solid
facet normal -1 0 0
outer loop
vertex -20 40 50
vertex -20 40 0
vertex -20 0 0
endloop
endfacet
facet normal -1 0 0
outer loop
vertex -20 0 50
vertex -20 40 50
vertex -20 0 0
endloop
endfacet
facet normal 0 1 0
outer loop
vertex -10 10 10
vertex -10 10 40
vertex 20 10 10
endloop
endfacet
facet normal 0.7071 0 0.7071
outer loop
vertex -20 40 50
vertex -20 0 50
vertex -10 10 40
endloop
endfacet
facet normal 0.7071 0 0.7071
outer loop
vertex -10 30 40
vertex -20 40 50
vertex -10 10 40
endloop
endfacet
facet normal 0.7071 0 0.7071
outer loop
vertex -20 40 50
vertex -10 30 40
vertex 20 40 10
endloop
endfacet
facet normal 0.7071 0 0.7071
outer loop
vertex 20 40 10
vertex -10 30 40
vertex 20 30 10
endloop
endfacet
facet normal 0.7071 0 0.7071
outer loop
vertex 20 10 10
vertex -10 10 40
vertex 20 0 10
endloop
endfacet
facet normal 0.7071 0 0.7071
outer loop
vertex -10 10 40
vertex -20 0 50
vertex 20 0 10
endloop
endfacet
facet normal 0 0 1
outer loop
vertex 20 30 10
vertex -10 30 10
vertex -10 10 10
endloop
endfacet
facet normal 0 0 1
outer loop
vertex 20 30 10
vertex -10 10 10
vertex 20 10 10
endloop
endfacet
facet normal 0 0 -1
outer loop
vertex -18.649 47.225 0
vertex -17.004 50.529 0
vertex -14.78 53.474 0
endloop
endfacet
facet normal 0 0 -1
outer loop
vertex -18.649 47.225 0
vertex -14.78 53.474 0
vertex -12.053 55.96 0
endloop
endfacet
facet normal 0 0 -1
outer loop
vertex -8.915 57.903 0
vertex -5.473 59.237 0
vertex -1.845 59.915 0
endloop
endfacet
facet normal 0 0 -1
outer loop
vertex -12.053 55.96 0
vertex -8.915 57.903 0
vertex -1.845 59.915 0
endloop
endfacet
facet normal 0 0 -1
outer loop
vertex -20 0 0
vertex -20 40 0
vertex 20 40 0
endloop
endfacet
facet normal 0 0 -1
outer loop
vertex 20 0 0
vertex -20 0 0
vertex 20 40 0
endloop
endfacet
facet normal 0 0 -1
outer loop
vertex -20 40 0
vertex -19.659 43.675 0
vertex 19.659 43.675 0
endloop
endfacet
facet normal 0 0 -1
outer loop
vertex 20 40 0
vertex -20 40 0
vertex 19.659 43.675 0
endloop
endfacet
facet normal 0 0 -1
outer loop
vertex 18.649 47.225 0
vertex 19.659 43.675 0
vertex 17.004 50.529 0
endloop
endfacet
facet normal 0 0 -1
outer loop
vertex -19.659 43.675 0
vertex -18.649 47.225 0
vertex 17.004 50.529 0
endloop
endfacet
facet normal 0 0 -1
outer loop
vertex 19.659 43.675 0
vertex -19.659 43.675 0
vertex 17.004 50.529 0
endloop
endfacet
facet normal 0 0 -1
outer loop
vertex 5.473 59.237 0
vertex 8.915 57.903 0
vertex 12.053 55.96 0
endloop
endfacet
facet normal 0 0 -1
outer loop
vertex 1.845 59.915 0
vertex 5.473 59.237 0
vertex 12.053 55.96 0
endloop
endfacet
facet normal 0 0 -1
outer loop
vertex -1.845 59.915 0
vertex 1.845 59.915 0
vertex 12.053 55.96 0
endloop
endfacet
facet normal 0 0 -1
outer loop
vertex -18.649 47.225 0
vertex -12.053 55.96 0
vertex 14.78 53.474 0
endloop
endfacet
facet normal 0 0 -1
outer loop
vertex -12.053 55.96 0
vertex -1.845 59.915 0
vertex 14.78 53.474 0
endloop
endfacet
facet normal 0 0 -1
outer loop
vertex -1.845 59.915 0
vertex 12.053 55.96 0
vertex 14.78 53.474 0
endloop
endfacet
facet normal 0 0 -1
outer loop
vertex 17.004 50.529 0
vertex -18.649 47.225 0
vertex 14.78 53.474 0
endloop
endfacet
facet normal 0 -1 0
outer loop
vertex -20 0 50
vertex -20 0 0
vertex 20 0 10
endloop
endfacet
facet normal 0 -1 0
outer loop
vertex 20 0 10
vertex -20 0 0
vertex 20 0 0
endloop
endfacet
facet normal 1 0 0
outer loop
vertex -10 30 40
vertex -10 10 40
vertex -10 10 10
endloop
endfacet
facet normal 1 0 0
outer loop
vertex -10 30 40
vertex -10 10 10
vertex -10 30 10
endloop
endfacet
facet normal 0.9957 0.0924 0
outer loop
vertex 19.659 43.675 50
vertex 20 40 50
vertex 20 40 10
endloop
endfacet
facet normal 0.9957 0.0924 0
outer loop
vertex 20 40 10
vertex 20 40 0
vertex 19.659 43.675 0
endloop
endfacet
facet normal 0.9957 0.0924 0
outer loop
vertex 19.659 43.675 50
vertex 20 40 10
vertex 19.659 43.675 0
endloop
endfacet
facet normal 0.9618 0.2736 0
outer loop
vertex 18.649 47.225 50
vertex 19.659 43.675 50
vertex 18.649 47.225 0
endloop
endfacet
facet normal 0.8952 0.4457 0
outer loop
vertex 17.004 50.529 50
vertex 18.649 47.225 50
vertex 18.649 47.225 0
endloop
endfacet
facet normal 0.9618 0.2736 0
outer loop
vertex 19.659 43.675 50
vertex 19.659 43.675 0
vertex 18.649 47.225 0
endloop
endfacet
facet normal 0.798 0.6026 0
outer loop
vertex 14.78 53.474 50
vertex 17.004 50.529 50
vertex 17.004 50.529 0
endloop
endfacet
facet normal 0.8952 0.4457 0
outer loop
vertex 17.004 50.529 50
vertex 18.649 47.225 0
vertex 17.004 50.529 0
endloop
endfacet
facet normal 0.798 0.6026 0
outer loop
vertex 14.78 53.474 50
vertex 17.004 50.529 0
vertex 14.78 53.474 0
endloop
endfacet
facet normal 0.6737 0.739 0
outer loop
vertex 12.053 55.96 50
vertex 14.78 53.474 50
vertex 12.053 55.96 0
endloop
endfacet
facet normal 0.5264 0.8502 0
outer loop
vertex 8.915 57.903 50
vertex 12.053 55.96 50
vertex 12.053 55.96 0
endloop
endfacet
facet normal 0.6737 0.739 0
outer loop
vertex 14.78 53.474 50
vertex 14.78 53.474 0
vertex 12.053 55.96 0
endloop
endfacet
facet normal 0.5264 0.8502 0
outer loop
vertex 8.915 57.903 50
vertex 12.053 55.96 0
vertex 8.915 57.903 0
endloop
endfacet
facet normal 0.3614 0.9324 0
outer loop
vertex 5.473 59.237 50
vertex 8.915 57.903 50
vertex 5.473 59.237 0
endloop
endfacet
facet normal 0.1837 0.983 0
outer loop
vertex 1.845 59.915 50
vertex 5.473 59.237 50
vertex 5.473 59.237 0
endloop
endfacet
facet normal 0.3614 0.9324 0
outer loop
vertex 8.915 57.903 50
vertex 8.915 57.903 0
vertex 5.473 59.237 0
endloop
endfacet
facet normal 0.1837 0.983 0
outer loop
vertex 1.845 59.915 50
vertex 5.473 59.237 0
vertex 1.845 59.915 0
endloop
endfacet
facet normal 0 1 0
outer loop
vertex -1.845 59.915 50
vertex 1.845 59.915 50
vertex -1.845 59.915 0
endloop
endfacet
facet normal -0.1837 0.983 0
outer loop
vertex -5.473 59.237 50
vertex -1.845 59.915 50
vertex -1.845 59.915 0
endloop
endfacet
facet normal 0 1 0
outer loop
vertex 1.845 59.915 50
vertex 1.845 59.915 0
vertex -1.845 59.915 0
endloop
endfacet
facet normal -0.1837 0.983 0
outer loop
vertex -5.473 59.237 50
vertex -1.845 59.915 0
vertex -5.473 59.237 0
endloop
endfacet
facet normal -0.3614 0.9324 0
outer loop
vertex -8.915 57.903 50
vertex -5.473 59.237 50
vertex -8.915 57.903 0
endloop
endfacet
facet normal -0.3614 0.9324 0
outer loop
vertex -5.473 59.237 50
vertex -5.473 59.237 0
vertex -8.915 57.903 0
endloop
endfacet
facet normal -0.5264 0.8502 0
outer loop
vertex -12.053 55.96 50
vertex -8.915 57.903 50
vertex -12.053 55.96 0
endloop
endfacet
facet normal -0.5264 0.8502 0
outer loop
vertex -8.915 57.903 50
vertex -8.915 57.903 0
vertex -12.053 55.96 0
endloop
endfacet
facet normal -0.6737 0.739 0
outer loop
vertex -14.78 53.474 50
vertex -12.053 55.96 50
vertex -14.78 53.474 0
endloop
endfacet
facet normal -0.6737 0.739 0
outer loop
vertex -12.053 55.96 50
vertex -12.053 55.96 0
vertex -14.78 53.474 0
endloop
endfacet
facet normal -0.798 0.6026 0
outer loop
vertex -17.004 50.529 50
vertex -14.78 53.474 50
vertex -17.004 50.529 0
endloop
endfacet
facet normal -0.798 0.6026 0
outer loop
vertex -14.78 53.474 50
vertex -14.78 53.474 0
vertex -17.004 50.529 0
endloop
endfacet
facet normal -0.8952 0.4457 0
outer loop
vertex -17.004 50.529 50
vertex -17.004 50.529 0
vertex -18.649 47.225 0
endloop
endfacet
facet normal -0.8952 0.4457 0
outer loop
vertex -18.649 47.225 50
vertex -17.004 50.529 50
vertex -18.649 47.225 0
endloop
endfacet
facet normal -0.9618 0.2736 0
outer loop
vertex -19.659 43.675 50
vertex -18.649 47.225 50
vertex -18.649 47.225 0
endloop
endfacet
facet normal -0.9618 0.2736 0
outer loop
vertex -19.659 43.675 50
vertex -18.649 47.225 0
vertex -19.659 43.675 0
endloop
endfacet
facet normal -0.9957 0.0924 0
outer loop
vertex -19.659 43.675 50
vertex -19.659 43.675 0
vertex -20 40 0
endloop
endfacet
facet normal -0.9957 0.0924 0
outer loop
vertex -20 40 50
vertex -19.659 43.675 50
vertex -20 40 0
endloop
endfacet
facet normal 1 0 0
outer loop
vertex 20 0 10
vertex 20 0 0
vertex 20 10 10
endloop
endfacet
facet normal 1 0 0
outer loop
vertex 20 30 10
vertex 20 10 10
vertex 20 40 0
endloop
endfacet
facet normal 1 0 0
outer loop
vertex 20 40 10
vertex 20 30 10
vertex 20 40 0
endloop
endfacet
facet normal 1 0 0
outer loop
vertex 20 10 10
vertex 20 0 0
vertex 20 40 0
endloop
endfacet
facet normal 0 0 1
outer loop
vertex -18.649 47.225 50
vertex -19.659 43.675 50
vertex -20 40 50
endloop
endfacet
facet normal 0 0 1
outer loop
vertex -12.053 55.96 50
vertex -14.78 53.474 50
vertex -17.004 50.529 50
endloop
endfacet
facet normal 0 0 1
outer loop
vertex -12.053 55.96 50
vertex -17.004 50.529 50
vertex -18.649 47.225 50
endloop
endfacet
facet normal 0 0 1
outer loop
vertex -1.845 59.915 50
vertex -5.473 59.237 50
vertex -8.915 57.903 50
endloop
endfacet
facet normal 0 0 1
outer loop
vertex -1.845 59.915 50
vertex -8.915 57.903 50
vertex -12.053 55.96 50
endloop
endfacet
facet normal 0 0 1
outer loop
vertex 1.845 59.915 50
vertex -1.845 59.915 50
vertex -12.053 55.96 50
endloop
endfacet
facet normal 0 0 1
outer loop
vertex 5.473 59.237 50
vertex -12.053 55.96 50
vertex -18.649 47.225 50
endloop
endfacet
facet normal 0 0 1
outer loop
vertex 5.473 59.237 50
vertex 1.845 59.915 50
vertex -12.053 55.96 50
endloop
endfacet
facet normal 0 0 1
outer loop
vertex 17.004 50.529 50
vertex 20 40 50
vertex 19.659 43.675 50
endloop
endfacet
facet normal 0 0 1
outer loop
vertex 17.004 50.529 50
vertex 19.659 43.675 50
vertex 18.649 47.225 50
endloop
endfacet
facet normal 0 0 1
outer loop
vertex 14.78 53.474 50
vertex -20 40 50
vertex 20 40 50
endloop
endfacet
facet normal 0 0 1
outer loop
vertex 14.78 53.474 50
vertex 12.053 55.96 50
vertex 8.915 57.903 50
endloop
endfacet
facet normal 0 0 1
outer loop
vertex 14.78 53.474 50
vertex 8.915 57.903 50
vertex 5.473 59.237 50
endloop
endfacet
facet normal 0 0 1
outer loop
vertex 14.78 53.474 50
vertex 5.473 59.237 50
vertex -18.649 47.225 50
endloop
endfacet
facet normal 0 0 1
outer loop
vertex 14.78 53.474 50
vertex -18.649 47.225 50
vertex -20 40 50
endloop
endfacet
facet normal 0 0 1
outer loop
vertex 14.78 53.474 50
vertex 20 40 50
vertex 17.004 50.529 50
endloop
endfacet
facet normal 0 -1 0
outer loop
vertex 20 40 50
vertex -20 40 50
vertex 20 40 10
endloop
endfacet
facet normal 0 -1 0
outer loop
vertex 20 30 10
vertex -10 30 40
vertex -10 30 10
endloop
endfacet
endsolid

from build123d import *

# Parameters (mm, degrees)
F1_DEPTH = 50
F3_W     = 30
F3_H     = 20
F4_DEPTH = 40
F5_DEPTH = 40


with BuildPart() as f1:
    # F0 (on Top) → F1 (new body)
    with BuildSketch(Plane.XY):
        with BuildLine():
            Line((-20, 40), (-20, 0))
            Line((-20, 0), (20, 0))
            Line((20, 0), (20, 40))
            ThreePointArc((20, 40), (0, 60), (-20, 40))
        make_face()
    extrude(amount=F1_DEPTH)

    # F3 (on face) → F4 (cut)
    with BuildSketch(Plane.XY.offset(50)):
        with Locations((5, 20)):
            Rectangle(F3_W, F3_H)
    extrude(amount=-F4_DEPTH, mode=Mode.SUBTRACT)

    # F2 (on face) → F5 (cut)
    with BuildSketch(Plane.XZ):
        Polygon((20, 50), (-20, 50), (20, 10), align=None)
    extrude(amount=-F5_DEPTH, mode=Mode.SUBTRACT)


solid = f1.part
